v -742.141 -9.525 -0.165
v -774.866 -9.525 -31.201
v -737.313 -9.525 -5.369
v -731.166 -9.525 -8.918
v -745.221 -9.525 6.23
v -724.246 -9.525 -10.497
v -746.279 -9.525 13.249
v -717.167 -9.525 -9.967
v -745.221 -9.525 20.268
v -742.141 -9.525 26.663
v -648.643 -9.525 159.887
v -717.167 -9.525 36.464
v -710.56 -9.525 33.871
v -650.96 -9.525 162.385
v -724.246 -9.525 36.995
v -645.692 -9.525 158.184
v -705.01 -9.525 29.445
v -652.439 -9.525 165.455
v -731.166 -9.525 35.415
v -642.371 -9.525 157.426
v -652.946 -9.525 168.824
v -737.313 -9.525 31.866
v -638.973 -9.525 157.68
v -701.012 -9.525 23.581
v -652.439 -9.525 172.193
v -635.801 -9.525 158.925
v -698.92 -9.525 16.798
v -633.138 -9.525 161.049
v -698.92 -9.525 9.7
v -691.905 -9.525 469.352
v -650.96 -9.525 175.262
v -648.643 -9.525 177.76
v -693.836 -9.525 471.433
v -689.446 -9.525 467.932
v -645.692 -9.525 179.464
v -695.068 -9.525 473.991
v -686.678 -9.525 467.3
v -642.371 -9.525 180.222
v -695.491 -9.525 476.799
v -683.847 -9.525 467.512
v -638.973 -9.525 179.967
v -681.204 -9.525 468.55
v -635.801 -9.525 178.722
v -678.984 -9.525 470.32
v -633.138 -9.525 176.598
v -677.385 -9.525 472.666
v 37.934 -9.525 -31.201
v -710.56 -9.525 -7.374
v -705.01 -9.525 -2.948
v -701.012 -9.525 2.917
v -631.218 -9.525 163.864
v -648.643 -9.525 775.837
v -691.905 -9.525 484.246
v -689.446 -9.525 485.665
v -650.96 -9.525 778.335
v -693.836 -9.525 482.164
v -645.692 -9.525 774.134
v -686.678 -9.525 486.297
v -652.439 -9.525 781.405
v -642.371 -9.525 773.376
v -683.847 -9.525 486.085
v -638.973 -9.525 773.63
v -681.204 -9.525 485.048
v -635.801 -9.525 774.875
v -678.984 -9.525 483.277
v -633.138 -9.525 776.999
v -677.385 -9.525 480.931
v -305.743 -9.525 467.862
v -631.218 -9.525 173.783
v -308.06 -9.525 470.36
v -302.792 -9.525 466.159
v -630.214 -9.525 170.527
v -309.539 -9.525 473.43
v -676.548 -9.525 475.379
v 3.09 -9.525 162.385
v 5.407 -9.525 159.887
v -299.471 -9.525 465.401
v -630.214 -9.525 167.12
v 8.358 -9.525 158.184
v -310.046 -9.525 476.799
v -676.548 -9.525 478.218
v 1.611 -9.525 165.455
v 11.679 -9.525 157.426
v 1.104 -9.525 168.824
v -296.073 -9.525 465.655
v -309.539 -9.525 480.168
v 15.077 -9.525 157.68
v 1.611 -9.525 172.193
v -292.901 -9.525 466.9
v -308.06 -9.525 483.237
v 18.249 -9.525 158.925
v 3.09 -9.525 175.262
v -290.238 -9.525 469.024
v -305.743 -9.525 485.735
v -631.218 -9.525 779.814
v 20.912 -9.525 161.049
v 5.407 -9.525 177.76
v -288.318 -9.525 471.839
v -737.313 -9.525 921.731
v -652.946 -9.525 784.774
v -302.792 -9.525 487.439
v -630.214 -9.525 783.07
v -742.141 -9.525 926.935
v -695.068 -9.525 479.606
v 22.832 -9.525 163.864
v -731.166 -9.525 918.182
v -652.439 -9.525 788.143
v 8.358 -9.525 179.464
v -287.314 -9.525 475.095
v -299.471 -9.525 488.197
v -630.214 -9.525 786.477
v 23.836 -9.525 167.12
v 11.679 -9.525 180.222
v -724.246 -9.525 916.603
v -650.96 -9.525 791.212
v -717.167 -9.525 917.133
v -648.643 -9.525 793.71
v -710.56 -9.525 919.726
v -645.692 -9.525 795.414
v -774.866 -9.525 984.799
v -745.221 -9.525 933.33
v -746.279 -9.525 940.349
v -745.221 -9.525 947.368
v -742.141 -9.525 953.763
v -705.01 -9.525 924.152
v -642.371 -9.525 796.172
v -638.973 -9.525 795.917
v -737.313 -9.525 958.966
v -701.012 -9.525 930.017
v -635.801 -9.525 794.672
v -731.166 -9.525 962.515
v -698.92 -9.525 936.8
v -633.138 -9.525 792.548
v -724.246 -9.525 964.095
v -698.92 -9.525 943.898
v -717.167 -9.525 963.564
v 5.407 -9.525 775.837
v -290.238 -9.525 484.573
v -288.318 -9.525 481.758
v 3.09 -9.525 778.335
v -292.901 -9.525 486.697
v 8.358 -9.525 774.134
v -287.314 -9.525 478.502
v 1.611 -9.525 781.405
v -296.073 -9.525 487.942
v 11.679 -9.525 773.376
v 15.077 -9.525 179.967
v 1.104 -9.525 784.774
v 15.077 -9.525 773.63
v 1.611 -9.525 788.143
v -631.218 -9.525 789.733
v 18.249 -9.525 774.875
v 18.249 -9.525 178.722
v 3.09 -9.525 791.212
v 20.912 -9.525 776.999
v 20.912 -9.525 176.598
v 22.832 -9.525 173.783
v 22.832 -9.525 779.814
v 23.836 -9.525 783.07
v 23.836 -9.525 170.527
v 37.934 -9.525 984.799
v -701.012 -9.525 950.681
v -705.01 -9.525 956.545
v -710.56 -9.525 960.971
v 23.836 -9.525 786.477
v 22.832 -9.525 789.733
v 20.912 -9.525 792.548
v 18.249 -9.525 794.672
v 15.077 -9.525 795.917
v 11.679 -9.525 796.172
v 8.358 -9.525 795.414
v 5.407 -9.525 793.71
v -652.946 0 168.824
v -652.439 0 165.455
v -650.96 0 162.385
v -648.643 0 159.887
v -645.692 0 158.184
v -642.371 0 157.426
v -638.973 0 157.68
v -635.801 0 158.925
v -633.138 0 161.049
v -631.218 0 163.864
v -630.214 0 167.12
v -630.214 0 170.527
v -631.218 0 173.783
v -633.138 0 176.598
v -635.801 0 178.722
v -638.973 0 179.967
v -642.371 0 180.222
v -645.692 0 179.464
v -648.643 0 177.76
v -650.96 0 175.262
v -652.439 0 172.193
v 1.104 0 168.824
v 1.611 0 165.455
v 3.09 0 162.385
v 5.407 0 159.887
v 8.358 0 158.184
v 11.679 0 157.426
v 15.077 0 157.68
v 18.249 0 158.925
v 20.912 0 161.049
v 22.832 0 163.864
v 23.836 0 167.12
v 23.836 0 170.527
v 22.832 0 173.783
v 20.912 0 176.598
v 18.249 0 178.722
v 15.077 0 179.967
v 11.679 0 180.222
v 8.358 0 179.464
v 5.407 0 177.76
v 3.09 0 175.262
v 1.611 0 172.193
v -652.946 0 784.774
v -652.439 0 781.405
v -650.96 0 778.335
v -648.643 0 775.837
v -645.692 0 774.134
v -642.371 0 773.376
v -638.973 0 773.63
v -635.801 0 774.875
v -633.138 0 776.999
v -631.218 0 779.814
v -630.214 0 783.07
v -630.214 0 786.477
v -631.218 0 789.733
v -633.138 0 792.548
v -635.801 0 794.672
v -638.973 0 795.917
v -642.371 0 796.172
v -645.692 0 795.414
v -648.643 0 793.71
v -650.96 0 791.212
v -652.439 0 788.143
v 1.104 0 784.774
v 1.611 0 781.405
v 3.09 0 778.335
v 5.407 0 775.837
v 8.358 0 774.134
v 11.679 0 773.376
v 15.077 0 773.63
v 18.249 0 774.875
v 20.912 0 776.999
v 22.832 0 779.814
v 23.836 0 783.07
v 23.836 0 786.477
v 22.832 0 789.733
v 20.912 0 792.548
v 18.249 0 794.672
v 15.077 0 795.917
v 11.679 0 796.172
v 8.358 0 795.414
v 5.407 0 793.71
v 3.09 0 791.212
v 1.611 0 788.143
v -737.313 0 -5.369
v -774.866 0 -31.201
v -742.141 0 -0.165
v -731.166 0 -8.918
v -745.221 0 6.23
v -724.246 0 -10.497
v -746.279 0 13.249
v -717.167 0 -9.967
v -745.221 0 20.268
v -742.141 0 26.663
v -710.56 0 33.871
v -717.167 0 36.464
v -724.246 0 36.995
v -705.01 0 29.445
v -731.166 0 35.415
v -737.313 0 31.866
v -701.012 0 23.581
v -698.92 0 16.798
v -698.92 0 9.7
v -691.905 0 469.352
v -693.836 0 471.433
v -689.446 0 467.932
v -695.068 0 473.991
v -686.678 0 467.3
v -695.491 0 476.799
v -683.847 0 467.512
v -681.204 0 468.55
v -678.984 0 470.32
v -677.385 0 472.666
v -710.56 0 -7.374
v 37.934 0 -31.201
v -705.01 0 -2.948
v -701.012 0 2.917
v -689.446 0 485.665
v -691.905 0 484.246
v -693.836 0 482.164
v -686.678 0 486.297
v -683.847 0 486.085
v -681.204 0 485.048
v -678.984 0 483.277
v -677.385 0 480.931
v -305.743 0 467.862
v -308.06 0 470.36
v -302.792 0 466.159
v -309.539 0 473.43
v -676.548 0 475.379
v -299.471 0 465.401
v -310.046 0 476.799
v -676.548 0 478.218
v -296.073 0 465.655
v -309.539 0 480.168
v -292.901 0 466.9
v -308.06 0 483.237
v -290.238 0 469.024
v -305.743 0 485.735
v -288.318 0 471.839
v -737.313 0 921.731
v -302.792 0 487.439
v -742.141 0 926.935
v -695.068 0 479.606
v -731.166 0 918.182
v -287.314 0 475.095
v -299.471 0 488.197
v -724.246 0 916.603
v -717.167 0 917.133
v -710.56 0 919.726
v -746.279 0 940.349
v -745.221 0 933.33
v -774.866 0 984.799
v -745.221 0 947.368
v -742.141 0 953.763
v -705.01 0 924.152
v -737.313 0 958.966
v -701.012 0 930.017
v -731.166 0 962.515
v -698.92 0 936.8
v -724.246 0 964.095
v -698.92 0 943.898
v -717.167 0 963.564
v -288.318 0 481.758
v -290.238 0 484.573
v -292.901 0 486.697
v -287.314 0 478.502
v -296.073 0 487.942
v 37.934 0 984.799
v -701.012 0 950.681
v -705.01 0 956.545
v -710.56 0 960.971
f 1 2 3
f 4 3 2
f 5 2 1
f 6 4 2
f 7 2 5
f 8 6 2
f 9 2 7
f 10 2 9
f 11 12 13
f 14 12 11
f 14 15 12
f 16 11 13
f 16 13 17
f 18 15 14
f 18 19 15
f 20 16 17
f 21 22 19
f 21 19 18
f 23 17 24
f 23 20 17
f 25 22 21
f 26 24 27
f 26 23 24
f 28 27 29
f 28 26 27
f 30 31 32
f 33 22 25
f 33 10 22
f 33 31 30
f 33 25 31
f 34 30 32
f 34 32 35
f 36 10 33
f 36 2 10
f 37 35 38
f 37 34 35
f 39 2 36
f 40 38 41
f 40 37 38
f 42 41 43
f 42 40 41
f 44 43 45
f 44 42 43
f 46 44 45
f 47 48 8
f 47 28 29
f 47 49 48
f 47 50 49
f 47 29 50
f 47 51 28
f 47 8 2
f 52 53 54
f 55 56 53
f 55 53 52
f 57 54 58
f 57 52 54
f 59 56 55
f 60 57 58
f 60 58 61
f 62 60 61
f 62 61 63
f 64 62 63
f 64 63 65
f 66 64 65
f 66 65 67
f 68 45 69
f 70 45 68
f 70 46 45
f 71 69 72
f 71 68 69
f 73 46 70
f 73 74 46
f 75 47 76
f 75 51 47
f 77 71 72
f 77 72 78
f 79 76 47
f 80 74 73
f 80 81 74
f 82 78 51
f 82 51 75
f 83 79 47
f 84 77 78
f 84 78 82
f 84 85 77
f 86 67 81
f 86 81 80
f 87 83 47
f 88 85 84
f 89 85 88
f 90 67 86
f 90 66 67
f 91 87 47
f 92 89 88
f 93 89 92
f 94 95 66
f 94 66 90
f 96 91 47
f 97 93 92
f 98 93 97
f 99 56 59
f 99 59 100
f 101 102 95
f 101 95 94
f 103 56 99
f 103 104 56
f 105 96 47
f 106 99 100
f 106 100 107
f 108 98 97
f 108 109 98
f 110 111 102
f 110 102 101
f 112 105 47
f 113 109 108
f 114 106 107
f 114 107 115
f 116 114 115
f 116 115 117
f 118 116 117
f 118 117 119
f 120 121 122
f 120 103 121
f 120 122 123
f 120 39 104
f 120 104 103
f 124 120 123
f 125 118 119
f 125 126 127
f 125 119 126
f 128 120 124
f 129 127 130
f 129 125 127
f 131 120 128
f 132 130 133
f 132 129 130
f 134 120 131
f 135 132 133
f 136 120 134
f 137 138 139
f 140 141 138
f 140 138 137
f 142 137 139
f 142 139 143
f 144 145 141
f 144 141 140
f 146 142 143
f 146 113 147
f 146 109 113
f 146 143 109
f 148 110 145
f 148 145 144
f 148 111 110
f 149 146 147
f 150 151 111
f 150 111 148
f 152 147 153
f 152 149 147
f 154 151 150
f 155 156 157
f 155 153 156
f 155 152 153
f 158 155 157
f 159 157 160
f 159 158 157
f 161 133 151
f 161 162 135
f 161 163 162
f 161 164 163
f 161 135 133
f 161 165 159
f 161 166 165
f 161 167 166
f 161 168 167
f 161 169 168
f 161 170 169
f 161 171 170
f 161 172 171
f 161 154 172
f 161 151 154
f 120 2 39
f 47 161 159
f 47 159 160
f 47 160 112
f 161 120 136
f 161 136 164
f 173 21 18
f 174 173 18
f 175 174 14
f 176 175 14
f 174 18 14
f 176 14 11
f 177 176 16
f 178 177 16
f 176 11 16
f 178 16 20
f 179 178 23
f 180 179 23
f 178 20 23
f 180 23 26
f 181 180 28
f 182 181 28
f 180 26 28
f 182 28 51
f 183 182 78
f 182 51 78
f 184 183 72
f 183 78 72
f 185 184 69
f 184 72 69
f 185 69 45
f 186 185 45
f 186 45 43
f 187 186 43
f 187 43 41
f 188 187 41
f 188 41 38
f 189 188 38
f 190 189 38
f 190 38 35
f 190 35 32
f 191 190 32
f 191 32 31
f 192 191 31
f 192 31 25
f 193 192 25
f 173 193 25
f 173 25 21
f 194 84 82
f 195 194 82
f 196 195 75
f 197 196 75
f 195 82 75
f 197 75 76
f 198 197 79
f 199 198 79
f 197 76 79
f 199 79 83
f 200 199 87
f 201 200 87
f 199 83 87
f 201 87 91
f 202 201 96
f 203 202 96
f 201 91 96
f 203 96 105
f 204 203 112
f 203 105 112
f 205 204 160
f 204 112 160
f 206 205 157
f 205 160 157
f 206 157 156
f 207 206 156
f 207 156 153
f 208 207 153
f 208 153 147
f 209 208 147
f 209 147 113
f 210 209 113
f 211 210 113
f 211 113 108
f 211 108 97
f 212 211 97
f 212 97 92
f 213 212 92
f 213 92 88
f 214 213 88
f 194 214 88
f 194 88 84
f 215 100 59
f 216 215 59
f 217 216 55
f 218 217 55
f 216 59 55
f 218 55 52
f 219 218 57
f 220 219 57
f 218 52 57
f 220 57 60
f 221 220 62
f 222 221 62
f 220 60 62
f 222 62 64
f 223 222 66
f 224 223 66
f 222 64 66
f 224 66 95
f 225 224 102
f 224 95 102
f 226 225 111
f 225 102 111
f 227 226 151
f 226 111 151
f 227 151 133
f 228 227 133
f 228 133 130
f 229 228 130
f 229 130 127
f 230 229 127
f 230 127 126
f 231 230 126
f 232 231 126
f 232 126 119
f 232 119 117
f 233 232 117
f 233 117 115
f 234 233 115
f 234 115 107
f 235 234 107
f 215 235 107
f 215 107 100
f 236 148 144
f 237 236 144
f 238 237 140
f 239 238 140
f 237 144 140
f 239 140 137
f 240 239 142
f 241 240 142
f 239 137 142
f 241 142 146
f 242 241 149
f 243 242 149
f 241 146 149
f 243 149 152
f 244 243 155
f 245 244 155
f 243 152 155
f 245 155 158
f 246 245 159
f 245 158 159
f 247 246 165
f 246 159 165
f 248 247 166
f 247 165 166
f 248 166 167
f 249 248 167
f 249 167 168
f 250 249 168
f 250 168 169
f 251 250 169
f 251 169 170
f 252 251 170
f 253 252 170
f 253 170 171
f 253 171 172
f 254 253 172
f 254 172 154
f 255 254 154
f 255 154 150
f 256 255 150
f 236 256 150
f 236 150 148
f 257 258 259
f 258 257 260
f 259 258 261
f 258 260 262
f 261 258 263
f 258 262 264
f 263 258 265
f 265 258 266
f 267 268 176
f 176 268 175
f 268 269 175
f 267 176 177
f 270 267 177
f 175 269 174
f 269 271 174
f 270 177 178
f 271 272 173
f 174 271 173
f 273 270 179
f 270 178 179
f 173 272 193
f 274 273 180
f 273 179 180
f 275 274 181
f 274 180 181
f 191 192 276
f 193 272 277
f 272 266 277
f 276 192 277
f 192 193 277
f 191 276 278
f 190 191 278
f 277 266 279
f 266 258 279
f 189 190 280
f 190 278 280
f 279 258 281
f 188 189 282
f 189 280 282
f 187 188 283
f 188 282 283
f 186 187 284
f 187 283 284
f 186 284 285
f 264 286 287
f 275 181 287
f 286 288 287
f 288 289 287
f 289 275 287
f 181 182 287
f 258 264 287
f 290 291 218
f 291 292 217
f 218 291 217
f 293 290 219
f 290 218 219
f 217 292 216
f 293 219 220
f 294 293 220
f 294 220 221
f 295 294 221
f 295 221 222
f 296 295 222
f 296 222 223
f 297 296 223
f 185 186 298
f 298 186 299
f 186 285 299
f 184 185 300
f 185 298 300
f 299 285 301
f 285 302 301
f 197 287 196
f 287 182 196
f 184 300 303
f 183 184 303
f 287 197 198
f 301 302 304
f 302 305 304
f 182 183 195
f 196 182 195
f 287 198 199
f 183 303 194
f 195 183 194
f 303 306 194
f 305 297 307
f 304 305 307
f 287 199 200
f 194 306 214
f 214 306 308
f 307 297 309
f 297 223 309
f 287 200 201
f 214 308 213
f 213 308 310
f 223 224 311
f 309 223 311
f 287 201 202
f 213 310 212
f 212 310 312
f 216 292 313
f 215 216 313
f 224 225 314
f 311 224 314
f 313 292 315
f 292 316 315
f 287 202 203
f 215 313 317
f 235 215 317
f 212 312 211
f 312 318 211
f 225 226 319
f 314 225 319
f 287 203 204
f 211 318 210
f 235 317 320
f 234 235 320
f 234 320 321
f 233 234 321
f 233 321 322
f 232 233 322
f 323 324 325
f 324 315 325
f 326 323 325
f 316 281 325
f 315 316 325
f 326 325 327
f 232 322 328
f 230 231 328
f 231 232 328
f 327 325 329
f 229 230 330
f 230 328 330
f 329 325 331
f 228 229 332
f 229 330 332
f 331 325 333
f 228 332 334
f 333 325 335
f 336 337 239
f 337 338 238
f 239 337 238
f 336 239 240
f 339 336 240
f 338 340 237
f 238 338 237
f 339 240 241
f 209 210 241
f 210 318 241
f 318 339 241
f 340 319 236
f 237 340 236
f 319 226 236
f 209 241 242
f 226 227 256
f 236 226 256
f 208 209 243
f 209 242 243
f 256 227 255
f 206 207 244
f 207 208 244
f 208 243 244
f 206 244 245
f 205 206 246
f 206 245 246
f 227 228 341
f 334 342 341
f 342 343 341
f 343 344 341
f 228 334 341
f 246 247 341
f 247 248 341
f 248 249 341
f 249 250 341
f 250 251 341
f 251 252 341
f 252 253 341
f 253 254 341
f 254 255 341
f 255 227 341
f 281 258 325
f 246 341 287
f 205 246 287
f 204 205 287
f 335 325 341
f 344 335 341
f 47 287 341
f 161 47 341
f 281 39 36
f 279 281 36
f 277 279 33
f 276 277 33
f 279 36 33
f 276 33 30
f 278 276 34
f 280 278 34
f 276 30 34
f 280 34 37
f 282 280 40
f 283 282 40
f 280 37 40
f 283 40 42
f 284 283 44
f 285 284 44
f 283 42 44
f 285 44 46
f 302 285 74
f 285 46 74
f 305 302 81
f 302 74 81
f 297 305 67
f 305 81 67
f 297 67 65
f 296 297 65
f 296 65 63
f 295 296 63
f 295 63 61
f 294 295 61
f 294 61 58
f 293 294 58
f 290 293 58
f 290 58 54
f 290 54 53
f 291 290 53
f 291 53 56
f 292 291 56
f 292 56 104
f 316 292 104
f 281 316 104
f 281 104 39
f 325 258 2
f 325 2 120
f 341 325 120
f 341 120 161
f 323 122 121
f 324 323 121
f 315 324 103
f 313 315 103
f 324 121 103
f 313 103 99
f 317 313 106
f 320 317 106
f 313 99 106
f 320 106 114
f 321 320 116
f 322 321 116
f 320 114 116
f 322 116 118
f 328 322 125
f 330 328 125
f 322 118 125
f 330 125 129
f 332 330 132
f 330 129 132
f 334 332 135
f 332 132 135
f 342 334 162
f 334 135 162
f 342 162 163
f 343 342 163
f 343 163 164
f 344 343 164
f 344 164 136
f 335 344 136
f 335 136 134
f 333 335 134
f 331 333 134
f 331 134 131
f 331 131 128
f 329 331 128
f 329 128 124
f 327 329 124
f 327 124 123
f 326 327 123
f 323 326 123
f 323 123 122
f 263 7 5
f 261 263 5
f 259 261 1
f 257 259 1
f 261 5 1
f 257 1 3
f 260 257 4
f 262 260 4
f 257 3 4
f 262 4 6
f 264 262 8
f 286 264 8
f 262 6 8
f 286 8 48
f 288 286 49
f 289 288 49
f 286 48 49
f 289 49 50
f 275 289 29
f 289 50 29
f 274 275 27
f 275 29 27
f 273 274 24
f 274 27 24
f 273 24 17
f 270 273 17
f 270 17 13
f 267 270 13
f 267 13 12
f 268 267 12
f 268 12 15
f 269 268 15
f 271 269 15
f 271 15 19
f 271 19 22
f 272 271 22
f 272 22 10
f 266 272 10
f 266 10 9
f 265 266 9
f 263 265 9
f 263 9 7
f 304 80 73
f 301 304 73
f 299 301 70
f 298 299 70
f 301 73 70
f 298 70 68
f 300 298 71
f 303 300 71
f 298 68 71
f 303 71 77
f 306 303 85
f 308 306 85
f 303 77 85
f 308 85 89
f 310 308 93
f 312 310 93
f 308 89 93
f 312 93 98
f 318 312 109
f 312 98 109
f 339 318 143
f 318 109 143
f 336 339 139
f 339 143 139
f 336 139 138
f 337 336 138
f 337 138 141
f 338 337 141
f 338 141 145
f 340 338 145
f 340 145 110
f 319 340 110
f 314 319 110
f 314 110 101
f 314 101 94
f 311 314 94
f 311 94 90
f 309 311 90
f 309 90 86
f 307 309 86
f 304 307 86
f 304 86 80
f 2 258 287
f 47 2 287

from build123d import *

# Parameters (mm, degrees)
F0_W     = 812.8
F0_H     = 1016
F1_DEPTH = 9.525
F3_D     = 47.625
F4_D     = 19.05
F5_D     = 22.86


with BuildPart() as f1:
    # F0 (on Front) → F1 (new body)
    with BuildSketch(Plane.XZ):
        with Locations((-368.4664566755, 476.7986876816)):
            Rectangle(F0_W, F0_H)
    extrude(amount=F1_DEPTH)

    # F3 (through all)
    with Locations(Plane(origin=(0, 0, 0), x_dir=(1, 0, 0), z_dir=(0, 1, 0))):
        with Locations((-722.4662566755, -940.3486876816), (-722.4662566755, -13.2486876816)):
            Hole(F3_D / 2)

    # F4 (through all)
    with Locations(Plane(origin=(0, 0, 0), x_dir=(1, 0, 0), z_dir=(0, 1, 0))):
        with Locations((-685.9664566755, -476.7986876816)):
            Hole(F4_D / 2)

    # F5 (through all)
    with Locations(Plane(origin=(0, 0, 0), x_dir=(1, 0, 0), z_dir=(0, 1, 0))):
        with Locations((-641.5164566755, -784.7736876816), (-298.6164566755, -476.7986876816), (12.5335433245, -784.7736876816), (12.5335433245, -168.8236876816), (-641.5164566755, -168.8236876816)):
            Hole(F5_D / 2)


solid = f1.part
